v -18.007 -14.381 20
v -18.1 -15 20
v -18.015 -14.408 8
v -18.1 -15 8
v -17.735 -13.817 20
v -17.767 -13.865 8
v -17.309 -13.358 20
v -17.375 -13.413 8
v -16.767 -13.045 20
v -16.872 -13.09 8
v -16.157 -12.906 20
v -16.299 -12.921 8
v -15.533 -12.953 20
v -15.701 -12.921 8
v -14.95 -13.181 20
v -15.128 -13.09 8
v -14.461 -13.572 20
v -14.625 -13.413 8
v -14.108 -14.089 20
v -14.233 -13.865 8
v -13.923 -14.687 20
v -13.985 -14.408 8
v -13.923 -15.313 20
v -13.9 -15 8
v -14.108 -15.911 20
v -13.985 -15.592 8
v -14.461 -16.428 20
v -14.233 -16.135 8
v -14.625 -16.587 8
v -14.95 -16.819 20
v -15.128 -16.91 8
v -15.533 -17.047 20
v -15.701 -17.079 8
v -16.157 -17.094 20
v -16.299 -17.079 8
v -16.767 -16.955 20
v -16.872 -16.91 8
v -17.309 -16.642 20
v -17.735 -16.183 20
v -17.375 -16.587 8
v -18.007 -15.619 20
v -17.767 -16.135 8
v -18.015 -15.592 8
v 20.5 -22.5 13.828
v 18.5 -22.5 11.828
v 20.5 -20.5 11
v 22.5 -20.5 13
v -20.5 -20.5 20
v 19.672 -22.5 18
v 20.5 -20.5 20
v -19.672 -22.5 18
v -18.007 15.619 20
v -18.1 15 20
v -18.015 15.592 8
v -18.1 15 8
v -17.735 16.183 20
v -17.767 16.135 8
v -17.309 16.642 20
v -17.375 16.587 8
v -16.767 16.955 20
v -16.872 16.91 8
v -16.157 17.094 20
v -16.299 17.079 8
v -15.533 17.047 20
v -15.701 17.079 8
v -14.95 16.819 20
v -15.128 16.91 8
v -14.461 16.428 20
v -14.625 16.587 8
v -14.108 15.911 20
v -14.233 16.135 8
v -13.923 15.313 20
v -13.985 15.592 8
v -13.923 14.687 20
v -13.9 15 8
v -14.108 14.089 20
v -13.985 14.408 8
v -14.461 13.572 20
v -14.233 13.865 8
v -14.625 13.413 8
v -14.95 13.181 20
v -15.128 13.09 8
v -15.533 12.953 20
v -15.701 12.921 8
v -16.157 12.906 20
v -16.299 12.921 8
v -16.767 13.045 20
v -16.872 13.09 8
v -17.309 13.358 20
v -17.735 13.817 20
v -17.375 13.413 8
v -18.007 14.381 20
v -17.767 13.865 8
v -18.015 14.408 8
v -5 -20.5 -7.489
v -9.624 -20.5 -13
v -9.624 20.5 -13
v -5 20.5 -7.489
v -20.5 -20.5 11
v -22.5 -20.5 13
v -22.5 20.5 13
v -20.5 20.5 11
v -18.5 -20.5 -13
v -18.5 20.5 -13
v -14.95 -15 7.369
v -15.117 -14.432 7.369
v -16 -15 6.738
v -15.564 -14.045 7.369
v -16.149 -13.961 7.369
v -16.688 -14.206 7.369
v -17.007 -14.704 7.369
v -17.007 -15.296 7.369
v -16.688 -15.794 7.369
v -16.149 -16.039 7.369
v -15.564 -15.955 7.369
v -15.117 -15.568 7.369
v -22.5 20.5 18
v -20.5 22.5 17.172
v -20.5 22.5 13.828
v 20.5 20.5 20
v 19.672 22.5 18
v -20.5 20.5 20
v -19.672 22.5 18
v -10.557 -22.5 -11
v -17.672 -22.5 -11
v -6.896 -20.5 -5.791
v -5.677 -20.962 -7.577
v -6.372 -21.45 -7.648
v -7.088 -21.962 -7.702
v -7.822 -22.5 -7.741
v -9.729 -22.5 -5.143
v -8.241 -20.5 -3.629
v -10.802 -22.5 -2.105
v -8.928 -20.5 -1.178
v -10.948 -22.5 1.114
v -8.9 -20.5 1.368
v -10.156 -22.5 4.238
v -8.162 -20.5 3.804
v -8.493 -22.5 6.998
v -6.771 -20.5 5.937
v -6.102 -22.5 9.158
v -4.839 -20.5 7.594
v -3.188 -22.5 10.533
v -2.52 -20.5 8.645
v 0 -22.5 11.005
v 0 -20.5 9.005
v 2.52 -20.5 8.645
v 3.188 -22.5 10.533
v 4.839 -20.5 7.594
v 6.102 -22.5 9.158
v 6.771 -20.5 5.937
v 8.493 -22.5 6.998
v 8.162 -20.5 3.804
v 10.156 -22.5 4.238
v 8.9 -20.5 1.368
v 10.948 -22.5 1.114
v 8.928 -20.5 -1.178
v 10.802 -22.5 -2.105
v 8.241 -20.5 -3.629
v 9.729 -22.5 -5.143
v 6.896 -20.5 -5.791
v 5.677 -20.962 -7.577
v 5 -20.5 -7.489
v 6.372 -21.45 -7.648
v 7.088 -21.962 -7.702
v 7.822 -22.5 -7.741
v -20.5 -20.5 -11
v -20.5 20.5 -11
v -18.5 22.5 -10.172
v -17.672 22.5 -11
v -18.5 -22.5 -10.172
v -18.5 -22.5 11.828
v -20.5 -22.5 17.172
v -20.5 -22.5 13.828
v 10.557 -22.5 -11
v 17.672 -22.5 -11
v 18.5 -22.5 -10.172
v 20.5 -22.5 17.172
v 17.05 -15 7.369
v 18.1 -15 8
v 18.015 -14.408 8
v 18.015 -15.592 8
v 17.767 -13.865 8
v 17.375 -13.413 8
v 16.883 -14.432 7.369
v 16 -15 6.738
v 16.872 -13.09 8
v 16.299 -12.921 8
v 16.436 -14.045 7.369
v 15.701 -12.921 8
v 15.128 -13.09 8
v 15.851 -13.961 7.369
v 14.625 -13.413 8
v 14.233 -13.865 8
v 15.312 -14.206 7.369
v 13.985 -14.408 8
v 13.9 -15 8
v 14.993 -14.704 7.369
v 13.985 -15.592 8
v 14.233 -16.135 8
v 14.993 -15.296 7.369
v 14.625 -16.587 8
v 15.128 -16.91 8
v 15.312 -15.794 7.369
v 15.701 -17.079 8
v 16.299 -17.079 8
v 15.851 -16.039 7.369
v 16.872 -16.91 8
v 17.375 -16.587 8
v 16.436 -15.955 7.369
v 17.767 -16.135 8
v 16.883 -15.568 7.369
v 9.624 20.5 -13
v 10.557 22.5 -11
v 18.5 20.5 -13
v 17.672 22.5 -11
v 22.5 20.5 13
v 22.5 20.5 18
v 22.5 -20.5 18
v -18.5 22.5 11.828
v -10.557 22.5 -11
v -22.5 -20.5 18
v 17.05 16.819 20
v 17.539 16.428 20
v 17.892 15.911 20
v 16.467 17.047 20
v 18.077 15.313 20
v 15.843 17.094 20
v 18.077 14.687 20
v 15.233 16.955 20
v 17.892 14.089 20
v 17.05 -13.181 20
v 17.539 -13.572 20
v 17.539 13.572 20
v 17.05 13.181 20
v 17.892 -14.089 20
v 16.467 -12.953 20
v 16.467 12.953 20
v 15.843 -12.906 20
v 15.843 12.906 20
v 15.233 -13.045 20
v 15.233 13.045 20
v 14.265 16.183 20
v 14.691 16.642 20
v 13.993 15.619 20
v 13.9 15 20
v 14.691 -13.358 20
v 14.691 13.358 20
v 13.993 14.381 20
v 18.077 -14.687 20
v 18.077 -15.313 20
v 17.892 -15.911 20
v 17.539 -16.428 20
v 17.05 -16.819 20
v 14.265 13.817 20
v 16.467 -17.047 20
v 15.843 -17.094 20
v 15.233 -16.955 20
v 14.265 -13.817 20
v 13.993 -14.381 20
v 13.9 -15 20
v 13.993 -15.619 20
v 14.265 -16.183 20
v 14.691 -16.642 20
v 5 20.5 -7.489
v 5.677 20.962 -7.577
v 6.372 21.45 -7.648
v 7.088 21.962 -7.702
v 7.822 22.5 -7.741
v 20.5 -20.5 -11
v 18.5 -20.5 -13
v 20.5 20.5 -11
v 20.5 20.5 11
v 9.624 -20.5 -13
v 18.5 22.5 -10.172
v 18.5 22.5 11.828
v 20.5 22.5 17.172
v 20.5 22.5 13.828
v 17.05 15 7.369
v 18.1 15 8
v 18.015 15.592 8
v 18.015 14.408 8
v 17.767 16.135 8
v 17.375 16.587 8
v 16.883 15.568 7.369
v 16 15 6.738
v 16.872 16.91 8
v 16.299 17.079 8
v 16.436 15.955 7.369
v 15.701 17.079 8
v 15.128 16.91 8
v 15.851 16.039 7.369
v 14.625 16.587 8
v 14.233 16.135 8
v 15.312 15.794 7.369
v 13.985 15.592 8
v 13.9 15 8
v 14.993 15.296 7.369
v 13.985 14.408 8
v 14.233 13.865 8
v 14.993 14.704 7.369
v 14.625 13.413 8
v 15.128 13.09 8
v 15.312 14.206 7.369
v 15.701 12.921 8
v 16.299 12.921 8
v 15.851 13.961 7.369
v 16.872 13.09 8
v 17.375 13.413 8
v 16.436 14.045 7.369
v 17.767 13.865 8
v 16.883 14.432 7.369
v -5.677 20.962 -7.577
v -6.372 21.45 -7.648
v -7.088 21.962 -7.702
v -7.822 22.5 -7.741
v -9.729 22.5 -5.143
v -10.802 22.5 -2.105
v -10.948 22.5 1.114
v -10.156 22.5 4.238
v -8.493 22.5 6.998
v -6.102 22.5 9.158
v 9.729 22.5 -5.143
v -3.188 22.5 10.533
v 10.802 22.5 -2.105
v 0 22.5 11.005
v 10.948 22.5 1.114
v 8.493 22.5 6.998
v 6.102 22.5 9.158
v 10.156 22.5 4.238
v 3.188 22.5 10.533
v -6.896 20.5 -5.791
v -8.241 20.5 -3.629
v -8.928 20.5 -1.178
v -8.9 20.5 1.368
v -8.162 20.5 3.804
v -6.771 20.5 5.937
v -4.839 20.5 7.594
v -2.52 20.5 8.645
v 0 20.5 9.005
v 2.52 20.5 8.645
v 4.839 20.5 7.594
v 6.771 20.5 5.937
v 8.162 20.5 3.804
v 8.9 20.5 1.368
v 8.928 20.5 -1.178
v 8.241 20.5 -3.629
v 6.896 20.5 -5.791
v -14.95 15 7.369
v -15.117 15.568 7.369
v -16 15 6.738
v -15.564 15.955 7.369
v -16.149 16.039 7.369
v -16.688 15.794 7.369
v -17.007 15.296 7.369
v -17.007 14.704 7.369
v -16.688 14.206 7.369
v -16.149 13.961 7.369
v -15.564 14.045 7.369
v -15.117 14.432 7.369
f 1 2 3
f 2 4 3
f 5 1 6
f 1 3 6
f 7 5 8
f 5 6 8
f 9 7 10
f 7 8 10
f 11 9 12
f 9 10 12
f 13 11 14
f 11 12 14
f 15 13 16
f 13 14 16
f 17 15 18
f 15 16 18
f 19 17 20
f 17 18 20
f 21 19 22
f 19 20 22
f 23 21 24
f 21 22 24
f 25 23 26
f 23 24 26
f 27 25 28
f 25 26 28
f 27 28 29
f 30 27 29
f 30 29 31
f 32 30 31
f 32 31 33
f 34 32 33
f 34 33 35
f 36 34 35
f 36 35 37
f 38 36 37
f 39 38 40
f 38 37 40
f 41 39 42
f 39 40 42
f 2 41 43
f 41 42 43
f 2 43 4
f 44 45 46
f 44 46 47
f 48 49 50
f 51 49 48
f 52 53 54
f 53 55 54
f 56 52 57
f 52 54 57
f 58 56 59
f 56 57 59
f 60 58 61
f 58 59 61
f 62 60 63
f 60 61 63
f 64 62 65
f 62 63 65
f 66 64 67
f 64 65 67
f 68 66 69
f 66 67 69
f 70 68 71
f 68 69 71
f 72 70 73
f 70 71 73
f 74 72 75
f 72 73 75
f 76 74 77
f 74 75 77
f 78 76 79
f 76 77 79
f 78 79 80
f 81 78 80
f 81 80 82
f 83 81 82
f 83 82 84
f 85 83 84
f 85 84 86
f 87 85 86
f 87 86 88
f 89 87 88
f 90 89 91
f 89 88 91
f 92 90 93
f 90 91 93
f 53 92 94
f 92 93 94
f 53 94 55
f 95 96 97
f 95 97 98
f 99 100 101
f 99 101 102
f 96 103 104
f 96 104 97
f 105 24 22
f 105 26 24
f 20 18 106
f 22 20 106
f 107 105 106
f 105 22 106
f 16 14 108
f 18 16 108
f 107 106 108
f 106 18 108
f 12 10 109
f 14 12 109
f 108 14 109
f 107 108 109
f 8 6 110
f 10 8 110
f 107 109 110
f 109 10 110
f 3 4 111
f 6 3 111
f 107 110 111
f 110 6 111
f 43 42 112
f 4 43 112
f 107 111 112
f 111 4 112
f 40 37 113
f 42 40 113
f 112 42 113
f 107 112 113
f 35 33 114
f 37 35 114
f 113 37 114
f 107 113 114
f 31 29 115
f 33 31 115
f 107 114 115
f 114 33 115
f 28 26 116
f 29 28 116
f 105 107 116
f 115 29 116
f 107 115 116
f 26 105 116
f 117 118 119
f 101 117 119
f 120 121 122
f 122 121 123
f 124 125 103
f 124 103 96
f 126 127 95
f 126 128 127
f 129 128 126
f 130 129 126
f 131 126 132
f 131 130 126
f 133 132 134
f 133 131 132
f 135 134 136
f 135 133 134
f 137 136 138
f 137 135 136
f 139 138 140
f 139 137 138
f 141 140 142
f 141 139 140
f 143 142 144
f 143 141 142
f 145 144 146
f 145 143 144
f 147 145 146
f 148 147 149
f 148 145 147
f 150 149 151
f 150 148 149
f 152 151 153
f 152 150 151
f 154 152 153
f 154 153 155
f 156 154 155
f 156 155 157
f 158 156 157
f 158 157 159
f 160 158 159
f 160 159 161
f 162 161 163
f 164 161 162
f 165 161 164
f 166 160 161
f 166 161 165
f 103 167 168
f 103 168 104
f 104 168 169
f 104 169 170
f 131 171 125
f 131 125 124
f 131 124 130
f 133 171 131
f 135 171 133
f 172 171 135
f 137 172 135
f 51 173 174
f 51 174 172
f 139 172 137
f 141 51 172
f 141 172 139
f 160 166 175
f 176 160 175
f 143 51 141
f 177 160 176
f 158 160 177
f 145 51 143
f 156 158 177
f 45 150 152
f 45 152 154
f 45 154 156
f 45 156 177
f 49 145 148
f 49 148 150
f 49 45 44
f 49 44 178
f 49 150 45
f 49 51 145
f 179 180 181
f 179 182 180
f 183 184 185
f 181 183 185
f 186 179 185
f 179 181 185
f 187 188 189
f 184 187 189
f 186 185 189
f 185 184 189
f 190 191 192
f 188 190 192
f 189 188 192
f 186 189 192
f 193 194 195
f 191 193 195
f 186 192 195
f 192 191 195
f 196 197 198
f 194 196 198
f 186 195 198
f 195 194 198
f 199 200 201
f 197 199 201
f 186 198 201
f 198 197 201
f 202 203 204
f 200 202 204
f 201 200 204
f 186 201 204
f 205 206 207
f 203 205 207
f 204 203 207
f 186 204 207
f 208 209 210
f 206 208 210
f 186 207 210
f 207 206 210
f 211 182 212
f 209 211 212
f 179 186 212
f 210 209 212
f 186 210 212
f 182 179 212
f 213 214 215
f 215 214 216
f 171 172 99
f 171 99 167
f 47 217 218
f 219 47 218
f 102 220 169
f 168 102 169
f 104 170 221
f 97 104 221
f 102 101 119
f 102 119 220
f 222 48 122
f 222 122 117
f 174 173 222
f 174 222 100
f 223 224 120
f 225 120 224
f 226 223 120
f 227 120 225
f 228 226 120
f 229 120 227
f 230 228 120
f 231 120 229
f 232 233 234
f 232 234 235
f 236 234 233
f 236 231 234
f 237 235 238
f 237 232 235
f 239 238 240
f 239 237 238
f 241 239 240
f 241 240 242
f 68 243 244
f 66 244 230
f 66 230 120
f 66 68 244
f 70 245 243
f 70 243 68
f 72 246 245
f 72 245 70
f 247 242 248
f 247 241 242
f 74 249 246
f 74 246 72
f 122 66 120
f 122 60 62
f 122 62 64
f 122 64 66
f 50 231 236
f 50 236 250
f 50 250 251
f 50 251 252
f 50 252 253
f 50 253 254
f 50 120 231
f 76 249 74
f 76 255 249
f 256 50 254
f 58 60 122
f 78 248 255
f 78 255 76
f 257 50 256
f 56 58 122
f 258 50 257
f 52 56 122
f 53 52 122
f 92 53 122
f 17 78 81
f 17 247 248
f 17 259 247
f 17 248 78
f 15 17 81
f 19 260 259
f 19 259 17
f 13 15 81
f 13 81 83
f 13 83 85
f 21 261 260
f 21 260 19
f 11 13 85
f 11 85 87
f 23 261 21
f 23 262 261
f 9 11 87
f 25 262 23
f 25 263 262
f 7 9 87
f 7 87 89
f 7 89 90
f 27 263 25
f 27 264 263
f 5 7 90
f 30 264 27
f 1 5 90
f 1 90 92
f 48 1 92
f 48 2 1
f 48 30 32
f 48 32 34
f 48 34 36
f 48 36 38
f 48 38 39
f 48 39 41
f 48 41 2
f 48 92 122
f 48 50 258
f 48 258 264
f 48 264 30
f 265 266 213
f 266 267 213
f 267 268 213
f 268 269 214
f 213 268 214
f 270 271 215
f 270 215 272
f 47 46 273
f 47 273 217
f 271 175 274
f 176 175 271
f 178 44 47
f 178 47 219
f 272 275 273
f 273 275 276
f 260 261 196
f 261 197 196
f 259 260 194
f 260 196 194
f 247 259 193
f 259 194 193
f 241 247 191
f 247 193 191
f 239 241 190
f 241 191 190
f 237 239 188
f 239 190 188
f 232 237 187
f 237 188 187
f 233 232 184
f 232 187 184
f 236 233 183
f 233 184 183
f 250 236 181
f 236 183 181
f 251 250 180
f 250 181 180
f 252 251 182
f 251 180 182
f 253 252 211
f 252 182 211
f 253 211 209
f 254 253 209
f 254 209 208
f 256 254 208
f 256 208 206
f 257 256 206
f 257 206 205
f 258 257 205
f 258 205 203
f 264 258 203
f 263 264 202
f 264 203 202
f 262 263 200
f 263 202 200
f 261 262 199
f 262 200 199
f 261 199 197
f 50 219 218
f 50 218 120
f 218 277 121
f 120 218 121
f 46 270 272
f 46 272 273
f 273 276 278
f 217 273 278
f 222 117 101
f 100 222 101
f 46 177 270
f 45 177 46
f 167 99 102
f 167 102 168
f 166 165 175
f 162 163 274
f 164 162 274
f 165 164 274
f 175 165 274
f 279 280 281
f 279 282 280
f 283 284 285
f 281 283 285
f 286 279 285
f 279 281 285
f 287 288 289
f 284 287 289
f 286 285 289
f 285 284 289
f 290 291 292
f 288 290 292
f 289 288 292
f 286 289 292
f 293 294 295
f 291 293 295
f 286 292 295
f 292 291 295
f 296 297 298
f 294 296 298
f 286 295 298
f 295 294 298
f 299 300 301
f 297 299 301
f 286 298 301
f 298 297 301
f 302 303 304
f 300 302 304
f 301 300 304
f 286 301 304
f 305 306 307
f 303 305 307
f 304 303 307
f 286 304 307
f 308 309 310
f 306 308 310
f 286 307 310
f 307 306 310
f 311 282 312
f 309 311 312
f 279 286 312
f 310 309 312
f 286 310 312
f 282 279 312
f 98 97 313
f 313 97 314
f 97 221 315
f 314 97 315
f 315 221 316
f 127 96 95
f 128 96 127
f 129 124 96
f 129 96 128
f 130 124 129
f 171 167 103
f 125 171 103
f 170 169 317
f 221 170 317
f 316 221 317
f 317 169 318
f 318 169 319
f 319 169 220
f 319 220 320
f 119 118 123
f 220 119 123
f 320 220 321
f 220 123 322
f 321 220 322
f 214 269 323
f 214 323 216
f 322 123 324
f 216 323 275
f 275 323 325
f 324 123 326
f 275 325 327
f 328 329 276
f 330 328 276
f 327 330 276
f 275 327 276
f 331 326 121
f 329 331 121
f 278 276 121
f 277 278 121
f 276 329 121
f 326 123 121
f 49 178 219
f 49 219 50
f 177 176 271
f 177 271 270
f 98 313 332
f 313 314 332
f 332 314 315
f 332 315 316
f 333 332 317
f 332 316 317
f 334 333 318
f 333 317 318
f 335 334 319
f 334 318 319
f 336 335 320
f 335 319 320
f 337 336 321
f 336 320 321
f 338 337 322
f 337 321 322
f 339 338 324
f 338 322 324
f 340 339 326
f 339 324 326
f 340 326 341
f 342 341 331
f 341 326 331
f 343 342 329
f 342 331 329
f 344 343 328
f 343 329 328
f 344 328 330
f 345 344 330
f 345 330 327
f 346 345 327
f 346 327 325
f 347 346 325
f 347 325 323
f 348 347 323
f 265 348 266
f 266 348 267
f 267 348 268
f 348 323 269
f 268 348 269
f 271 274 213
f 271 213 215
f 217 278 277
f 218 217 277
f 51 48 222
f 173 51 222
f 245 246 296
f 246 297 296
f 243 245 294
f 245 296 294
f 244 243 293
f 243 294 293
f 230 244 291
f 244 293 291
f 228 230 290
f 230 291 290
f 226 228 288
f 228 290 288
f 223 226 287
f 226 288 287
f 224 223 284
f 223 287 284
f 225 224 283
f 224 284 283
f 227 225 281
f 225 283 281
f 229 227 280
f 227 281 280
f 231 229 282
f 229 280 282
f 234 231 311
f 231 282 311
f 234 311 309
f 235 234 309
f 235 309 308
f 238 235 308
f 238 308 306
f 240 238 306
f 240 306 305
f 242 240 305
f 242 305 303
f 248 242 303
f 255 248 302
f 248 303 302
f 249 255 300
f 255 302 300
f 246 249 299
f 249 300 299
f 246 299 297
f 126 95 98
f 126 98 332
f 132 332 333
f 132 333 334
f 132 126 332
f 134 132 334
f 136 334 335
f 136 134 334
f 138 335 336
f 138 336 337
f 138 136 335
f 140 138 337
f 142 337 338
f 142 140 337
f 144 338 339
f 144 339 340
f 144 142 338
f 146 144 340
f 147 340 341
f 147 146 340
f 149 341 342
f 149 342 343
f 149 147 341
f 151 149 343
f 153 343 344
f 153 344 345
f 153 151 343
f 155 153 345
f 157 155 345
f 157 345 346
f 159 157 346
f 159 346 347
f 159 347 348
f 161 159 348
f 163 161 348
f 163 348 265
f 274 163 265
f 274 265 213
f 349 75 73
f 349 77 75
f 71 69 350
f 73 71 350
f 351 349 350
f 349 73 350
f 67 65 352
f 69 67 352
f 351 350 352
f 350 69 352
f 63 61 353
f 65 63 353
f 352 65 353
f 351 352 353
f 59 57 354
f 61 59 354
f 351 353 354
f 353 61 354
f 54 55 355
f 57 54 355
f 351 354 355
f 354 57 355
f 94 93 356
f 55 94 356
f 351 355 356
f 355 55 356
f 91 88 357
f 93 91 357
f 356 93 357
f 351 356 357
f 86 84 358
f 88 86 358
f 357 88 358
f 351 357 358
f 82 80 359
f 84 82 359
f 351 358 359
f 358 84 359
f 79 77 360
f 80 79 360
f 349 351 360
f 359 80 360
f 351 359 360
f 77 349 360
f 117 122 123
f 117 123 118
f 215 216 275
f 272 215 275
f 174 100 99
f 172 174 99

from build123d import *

# Parameters (mm, degrees)
F1_DEPTH = 22.5
F2_SIZE  = 2
F4_D     = 4.2
F4_DEPTH = 12
F4_TIP   = 1.2618073


with BuildPart() as f1:
    # F0 (on Front) → F1 (new body, symmetric)
    with BuildSketch(Plane.XZ):
        with BuildLine():
            ThreePointArc((-5, -7.4893274064), (0, 9.005), (5, -7.4893274064))
            Line((5, -7.4893274064), (9.6240033408, -13))
            Line((9.6240033408, -13), (18.5, -13))
            Line((18.5, -13), (20.5, -11))
            Line((20.5, -11), (20.5, 11))
            Line((20.5, 11), (22.5, 13))
            Line((22.5, 13), (22.5, 18))
            Line((22.5, 18), (20.5, 20))
            Line((20.5, 20), (-20.5, 20))
            Line((-20.5, 20), (-22.5, 18))
            Line((-22.5, 18), (-22.5, 13))
            Line((-22.5, 13), (-20.5, 11))
            Line((-20.5, 11), (-20.5, -11))
            Line((-20.5, -11), (-18.5, -13))
            Line((-18.5, -13), (-9.6240033408, -13))
            Line((-9.6240033408, -13), (-5, -7.4893274064))
        make_face()
    extrude(amount=F1_DEPTH, both=True)

    # F2
    f2_edges = [f1.edges().sort_by_distance(p)[0] for p in [
        (0, -22.5, 9.005),
        (7.312002, -22.5, -10.244664),
        (14.062002, -22.5, -13),
        (19.5, -22.5, -12),
        (20.5, -22.5, 0),
        (21.5, -22.5, 12),
        (22.5, -22.5, 15.5),
        (21.5, -22.5, 19),
        (0, -22.5, 20),
        (-21.5, -22.5, 19),
        (-22.5, -22.5, 15.5),
        (-21.5, -22.5, 12),
        (-20.5, -22.5, 0),
        (-19.5, -22.5, -12),
        (-14.062002, -22.5, -13),
        (-7.312002, -22.5, -10.244664),
        (0, 22.5, 9.005),
        (7.312002, 22.5, -10.244664),
        (14.062002, 22.5, -13),
        (19.5, 22.5, -12),
        (20.5, 22.5, 0),
        (21.5, 22.5, 12),
        (22.5, 22.5, 15.5),
        (21.5, 22.5, 19),
        (0, 22.5, 20),
        (-21.5, 22.5, 19),
        (-22.5, 22.5, 15.5),
        (-21.5, 22.5, 12),
        (-20.5, 22.5, 0),
        (-19.5, 22.5, -12),
        (-14.062002, 22.5, -13),
        (-7.312002, 22.5, -10.244664),
    ]]
    chamfer(f2_edges, length=F2_SIZE)

    # F4
    with Locations(Plane.XY.offset(20)):
        with Locations((-16, 15), (16, 15), (16, -15), (-16, -15)):
            Hole(F4_D / 2, depth=F4_DEPTH)
            with Locations((0, 0, -(F4_DEPTH + F4_TIP / 2))):  # 118° drill point
                Cone(0, F4_D / 2, F4_TIP, mode=Mode.SUBTRACT)


solid = f1.part
